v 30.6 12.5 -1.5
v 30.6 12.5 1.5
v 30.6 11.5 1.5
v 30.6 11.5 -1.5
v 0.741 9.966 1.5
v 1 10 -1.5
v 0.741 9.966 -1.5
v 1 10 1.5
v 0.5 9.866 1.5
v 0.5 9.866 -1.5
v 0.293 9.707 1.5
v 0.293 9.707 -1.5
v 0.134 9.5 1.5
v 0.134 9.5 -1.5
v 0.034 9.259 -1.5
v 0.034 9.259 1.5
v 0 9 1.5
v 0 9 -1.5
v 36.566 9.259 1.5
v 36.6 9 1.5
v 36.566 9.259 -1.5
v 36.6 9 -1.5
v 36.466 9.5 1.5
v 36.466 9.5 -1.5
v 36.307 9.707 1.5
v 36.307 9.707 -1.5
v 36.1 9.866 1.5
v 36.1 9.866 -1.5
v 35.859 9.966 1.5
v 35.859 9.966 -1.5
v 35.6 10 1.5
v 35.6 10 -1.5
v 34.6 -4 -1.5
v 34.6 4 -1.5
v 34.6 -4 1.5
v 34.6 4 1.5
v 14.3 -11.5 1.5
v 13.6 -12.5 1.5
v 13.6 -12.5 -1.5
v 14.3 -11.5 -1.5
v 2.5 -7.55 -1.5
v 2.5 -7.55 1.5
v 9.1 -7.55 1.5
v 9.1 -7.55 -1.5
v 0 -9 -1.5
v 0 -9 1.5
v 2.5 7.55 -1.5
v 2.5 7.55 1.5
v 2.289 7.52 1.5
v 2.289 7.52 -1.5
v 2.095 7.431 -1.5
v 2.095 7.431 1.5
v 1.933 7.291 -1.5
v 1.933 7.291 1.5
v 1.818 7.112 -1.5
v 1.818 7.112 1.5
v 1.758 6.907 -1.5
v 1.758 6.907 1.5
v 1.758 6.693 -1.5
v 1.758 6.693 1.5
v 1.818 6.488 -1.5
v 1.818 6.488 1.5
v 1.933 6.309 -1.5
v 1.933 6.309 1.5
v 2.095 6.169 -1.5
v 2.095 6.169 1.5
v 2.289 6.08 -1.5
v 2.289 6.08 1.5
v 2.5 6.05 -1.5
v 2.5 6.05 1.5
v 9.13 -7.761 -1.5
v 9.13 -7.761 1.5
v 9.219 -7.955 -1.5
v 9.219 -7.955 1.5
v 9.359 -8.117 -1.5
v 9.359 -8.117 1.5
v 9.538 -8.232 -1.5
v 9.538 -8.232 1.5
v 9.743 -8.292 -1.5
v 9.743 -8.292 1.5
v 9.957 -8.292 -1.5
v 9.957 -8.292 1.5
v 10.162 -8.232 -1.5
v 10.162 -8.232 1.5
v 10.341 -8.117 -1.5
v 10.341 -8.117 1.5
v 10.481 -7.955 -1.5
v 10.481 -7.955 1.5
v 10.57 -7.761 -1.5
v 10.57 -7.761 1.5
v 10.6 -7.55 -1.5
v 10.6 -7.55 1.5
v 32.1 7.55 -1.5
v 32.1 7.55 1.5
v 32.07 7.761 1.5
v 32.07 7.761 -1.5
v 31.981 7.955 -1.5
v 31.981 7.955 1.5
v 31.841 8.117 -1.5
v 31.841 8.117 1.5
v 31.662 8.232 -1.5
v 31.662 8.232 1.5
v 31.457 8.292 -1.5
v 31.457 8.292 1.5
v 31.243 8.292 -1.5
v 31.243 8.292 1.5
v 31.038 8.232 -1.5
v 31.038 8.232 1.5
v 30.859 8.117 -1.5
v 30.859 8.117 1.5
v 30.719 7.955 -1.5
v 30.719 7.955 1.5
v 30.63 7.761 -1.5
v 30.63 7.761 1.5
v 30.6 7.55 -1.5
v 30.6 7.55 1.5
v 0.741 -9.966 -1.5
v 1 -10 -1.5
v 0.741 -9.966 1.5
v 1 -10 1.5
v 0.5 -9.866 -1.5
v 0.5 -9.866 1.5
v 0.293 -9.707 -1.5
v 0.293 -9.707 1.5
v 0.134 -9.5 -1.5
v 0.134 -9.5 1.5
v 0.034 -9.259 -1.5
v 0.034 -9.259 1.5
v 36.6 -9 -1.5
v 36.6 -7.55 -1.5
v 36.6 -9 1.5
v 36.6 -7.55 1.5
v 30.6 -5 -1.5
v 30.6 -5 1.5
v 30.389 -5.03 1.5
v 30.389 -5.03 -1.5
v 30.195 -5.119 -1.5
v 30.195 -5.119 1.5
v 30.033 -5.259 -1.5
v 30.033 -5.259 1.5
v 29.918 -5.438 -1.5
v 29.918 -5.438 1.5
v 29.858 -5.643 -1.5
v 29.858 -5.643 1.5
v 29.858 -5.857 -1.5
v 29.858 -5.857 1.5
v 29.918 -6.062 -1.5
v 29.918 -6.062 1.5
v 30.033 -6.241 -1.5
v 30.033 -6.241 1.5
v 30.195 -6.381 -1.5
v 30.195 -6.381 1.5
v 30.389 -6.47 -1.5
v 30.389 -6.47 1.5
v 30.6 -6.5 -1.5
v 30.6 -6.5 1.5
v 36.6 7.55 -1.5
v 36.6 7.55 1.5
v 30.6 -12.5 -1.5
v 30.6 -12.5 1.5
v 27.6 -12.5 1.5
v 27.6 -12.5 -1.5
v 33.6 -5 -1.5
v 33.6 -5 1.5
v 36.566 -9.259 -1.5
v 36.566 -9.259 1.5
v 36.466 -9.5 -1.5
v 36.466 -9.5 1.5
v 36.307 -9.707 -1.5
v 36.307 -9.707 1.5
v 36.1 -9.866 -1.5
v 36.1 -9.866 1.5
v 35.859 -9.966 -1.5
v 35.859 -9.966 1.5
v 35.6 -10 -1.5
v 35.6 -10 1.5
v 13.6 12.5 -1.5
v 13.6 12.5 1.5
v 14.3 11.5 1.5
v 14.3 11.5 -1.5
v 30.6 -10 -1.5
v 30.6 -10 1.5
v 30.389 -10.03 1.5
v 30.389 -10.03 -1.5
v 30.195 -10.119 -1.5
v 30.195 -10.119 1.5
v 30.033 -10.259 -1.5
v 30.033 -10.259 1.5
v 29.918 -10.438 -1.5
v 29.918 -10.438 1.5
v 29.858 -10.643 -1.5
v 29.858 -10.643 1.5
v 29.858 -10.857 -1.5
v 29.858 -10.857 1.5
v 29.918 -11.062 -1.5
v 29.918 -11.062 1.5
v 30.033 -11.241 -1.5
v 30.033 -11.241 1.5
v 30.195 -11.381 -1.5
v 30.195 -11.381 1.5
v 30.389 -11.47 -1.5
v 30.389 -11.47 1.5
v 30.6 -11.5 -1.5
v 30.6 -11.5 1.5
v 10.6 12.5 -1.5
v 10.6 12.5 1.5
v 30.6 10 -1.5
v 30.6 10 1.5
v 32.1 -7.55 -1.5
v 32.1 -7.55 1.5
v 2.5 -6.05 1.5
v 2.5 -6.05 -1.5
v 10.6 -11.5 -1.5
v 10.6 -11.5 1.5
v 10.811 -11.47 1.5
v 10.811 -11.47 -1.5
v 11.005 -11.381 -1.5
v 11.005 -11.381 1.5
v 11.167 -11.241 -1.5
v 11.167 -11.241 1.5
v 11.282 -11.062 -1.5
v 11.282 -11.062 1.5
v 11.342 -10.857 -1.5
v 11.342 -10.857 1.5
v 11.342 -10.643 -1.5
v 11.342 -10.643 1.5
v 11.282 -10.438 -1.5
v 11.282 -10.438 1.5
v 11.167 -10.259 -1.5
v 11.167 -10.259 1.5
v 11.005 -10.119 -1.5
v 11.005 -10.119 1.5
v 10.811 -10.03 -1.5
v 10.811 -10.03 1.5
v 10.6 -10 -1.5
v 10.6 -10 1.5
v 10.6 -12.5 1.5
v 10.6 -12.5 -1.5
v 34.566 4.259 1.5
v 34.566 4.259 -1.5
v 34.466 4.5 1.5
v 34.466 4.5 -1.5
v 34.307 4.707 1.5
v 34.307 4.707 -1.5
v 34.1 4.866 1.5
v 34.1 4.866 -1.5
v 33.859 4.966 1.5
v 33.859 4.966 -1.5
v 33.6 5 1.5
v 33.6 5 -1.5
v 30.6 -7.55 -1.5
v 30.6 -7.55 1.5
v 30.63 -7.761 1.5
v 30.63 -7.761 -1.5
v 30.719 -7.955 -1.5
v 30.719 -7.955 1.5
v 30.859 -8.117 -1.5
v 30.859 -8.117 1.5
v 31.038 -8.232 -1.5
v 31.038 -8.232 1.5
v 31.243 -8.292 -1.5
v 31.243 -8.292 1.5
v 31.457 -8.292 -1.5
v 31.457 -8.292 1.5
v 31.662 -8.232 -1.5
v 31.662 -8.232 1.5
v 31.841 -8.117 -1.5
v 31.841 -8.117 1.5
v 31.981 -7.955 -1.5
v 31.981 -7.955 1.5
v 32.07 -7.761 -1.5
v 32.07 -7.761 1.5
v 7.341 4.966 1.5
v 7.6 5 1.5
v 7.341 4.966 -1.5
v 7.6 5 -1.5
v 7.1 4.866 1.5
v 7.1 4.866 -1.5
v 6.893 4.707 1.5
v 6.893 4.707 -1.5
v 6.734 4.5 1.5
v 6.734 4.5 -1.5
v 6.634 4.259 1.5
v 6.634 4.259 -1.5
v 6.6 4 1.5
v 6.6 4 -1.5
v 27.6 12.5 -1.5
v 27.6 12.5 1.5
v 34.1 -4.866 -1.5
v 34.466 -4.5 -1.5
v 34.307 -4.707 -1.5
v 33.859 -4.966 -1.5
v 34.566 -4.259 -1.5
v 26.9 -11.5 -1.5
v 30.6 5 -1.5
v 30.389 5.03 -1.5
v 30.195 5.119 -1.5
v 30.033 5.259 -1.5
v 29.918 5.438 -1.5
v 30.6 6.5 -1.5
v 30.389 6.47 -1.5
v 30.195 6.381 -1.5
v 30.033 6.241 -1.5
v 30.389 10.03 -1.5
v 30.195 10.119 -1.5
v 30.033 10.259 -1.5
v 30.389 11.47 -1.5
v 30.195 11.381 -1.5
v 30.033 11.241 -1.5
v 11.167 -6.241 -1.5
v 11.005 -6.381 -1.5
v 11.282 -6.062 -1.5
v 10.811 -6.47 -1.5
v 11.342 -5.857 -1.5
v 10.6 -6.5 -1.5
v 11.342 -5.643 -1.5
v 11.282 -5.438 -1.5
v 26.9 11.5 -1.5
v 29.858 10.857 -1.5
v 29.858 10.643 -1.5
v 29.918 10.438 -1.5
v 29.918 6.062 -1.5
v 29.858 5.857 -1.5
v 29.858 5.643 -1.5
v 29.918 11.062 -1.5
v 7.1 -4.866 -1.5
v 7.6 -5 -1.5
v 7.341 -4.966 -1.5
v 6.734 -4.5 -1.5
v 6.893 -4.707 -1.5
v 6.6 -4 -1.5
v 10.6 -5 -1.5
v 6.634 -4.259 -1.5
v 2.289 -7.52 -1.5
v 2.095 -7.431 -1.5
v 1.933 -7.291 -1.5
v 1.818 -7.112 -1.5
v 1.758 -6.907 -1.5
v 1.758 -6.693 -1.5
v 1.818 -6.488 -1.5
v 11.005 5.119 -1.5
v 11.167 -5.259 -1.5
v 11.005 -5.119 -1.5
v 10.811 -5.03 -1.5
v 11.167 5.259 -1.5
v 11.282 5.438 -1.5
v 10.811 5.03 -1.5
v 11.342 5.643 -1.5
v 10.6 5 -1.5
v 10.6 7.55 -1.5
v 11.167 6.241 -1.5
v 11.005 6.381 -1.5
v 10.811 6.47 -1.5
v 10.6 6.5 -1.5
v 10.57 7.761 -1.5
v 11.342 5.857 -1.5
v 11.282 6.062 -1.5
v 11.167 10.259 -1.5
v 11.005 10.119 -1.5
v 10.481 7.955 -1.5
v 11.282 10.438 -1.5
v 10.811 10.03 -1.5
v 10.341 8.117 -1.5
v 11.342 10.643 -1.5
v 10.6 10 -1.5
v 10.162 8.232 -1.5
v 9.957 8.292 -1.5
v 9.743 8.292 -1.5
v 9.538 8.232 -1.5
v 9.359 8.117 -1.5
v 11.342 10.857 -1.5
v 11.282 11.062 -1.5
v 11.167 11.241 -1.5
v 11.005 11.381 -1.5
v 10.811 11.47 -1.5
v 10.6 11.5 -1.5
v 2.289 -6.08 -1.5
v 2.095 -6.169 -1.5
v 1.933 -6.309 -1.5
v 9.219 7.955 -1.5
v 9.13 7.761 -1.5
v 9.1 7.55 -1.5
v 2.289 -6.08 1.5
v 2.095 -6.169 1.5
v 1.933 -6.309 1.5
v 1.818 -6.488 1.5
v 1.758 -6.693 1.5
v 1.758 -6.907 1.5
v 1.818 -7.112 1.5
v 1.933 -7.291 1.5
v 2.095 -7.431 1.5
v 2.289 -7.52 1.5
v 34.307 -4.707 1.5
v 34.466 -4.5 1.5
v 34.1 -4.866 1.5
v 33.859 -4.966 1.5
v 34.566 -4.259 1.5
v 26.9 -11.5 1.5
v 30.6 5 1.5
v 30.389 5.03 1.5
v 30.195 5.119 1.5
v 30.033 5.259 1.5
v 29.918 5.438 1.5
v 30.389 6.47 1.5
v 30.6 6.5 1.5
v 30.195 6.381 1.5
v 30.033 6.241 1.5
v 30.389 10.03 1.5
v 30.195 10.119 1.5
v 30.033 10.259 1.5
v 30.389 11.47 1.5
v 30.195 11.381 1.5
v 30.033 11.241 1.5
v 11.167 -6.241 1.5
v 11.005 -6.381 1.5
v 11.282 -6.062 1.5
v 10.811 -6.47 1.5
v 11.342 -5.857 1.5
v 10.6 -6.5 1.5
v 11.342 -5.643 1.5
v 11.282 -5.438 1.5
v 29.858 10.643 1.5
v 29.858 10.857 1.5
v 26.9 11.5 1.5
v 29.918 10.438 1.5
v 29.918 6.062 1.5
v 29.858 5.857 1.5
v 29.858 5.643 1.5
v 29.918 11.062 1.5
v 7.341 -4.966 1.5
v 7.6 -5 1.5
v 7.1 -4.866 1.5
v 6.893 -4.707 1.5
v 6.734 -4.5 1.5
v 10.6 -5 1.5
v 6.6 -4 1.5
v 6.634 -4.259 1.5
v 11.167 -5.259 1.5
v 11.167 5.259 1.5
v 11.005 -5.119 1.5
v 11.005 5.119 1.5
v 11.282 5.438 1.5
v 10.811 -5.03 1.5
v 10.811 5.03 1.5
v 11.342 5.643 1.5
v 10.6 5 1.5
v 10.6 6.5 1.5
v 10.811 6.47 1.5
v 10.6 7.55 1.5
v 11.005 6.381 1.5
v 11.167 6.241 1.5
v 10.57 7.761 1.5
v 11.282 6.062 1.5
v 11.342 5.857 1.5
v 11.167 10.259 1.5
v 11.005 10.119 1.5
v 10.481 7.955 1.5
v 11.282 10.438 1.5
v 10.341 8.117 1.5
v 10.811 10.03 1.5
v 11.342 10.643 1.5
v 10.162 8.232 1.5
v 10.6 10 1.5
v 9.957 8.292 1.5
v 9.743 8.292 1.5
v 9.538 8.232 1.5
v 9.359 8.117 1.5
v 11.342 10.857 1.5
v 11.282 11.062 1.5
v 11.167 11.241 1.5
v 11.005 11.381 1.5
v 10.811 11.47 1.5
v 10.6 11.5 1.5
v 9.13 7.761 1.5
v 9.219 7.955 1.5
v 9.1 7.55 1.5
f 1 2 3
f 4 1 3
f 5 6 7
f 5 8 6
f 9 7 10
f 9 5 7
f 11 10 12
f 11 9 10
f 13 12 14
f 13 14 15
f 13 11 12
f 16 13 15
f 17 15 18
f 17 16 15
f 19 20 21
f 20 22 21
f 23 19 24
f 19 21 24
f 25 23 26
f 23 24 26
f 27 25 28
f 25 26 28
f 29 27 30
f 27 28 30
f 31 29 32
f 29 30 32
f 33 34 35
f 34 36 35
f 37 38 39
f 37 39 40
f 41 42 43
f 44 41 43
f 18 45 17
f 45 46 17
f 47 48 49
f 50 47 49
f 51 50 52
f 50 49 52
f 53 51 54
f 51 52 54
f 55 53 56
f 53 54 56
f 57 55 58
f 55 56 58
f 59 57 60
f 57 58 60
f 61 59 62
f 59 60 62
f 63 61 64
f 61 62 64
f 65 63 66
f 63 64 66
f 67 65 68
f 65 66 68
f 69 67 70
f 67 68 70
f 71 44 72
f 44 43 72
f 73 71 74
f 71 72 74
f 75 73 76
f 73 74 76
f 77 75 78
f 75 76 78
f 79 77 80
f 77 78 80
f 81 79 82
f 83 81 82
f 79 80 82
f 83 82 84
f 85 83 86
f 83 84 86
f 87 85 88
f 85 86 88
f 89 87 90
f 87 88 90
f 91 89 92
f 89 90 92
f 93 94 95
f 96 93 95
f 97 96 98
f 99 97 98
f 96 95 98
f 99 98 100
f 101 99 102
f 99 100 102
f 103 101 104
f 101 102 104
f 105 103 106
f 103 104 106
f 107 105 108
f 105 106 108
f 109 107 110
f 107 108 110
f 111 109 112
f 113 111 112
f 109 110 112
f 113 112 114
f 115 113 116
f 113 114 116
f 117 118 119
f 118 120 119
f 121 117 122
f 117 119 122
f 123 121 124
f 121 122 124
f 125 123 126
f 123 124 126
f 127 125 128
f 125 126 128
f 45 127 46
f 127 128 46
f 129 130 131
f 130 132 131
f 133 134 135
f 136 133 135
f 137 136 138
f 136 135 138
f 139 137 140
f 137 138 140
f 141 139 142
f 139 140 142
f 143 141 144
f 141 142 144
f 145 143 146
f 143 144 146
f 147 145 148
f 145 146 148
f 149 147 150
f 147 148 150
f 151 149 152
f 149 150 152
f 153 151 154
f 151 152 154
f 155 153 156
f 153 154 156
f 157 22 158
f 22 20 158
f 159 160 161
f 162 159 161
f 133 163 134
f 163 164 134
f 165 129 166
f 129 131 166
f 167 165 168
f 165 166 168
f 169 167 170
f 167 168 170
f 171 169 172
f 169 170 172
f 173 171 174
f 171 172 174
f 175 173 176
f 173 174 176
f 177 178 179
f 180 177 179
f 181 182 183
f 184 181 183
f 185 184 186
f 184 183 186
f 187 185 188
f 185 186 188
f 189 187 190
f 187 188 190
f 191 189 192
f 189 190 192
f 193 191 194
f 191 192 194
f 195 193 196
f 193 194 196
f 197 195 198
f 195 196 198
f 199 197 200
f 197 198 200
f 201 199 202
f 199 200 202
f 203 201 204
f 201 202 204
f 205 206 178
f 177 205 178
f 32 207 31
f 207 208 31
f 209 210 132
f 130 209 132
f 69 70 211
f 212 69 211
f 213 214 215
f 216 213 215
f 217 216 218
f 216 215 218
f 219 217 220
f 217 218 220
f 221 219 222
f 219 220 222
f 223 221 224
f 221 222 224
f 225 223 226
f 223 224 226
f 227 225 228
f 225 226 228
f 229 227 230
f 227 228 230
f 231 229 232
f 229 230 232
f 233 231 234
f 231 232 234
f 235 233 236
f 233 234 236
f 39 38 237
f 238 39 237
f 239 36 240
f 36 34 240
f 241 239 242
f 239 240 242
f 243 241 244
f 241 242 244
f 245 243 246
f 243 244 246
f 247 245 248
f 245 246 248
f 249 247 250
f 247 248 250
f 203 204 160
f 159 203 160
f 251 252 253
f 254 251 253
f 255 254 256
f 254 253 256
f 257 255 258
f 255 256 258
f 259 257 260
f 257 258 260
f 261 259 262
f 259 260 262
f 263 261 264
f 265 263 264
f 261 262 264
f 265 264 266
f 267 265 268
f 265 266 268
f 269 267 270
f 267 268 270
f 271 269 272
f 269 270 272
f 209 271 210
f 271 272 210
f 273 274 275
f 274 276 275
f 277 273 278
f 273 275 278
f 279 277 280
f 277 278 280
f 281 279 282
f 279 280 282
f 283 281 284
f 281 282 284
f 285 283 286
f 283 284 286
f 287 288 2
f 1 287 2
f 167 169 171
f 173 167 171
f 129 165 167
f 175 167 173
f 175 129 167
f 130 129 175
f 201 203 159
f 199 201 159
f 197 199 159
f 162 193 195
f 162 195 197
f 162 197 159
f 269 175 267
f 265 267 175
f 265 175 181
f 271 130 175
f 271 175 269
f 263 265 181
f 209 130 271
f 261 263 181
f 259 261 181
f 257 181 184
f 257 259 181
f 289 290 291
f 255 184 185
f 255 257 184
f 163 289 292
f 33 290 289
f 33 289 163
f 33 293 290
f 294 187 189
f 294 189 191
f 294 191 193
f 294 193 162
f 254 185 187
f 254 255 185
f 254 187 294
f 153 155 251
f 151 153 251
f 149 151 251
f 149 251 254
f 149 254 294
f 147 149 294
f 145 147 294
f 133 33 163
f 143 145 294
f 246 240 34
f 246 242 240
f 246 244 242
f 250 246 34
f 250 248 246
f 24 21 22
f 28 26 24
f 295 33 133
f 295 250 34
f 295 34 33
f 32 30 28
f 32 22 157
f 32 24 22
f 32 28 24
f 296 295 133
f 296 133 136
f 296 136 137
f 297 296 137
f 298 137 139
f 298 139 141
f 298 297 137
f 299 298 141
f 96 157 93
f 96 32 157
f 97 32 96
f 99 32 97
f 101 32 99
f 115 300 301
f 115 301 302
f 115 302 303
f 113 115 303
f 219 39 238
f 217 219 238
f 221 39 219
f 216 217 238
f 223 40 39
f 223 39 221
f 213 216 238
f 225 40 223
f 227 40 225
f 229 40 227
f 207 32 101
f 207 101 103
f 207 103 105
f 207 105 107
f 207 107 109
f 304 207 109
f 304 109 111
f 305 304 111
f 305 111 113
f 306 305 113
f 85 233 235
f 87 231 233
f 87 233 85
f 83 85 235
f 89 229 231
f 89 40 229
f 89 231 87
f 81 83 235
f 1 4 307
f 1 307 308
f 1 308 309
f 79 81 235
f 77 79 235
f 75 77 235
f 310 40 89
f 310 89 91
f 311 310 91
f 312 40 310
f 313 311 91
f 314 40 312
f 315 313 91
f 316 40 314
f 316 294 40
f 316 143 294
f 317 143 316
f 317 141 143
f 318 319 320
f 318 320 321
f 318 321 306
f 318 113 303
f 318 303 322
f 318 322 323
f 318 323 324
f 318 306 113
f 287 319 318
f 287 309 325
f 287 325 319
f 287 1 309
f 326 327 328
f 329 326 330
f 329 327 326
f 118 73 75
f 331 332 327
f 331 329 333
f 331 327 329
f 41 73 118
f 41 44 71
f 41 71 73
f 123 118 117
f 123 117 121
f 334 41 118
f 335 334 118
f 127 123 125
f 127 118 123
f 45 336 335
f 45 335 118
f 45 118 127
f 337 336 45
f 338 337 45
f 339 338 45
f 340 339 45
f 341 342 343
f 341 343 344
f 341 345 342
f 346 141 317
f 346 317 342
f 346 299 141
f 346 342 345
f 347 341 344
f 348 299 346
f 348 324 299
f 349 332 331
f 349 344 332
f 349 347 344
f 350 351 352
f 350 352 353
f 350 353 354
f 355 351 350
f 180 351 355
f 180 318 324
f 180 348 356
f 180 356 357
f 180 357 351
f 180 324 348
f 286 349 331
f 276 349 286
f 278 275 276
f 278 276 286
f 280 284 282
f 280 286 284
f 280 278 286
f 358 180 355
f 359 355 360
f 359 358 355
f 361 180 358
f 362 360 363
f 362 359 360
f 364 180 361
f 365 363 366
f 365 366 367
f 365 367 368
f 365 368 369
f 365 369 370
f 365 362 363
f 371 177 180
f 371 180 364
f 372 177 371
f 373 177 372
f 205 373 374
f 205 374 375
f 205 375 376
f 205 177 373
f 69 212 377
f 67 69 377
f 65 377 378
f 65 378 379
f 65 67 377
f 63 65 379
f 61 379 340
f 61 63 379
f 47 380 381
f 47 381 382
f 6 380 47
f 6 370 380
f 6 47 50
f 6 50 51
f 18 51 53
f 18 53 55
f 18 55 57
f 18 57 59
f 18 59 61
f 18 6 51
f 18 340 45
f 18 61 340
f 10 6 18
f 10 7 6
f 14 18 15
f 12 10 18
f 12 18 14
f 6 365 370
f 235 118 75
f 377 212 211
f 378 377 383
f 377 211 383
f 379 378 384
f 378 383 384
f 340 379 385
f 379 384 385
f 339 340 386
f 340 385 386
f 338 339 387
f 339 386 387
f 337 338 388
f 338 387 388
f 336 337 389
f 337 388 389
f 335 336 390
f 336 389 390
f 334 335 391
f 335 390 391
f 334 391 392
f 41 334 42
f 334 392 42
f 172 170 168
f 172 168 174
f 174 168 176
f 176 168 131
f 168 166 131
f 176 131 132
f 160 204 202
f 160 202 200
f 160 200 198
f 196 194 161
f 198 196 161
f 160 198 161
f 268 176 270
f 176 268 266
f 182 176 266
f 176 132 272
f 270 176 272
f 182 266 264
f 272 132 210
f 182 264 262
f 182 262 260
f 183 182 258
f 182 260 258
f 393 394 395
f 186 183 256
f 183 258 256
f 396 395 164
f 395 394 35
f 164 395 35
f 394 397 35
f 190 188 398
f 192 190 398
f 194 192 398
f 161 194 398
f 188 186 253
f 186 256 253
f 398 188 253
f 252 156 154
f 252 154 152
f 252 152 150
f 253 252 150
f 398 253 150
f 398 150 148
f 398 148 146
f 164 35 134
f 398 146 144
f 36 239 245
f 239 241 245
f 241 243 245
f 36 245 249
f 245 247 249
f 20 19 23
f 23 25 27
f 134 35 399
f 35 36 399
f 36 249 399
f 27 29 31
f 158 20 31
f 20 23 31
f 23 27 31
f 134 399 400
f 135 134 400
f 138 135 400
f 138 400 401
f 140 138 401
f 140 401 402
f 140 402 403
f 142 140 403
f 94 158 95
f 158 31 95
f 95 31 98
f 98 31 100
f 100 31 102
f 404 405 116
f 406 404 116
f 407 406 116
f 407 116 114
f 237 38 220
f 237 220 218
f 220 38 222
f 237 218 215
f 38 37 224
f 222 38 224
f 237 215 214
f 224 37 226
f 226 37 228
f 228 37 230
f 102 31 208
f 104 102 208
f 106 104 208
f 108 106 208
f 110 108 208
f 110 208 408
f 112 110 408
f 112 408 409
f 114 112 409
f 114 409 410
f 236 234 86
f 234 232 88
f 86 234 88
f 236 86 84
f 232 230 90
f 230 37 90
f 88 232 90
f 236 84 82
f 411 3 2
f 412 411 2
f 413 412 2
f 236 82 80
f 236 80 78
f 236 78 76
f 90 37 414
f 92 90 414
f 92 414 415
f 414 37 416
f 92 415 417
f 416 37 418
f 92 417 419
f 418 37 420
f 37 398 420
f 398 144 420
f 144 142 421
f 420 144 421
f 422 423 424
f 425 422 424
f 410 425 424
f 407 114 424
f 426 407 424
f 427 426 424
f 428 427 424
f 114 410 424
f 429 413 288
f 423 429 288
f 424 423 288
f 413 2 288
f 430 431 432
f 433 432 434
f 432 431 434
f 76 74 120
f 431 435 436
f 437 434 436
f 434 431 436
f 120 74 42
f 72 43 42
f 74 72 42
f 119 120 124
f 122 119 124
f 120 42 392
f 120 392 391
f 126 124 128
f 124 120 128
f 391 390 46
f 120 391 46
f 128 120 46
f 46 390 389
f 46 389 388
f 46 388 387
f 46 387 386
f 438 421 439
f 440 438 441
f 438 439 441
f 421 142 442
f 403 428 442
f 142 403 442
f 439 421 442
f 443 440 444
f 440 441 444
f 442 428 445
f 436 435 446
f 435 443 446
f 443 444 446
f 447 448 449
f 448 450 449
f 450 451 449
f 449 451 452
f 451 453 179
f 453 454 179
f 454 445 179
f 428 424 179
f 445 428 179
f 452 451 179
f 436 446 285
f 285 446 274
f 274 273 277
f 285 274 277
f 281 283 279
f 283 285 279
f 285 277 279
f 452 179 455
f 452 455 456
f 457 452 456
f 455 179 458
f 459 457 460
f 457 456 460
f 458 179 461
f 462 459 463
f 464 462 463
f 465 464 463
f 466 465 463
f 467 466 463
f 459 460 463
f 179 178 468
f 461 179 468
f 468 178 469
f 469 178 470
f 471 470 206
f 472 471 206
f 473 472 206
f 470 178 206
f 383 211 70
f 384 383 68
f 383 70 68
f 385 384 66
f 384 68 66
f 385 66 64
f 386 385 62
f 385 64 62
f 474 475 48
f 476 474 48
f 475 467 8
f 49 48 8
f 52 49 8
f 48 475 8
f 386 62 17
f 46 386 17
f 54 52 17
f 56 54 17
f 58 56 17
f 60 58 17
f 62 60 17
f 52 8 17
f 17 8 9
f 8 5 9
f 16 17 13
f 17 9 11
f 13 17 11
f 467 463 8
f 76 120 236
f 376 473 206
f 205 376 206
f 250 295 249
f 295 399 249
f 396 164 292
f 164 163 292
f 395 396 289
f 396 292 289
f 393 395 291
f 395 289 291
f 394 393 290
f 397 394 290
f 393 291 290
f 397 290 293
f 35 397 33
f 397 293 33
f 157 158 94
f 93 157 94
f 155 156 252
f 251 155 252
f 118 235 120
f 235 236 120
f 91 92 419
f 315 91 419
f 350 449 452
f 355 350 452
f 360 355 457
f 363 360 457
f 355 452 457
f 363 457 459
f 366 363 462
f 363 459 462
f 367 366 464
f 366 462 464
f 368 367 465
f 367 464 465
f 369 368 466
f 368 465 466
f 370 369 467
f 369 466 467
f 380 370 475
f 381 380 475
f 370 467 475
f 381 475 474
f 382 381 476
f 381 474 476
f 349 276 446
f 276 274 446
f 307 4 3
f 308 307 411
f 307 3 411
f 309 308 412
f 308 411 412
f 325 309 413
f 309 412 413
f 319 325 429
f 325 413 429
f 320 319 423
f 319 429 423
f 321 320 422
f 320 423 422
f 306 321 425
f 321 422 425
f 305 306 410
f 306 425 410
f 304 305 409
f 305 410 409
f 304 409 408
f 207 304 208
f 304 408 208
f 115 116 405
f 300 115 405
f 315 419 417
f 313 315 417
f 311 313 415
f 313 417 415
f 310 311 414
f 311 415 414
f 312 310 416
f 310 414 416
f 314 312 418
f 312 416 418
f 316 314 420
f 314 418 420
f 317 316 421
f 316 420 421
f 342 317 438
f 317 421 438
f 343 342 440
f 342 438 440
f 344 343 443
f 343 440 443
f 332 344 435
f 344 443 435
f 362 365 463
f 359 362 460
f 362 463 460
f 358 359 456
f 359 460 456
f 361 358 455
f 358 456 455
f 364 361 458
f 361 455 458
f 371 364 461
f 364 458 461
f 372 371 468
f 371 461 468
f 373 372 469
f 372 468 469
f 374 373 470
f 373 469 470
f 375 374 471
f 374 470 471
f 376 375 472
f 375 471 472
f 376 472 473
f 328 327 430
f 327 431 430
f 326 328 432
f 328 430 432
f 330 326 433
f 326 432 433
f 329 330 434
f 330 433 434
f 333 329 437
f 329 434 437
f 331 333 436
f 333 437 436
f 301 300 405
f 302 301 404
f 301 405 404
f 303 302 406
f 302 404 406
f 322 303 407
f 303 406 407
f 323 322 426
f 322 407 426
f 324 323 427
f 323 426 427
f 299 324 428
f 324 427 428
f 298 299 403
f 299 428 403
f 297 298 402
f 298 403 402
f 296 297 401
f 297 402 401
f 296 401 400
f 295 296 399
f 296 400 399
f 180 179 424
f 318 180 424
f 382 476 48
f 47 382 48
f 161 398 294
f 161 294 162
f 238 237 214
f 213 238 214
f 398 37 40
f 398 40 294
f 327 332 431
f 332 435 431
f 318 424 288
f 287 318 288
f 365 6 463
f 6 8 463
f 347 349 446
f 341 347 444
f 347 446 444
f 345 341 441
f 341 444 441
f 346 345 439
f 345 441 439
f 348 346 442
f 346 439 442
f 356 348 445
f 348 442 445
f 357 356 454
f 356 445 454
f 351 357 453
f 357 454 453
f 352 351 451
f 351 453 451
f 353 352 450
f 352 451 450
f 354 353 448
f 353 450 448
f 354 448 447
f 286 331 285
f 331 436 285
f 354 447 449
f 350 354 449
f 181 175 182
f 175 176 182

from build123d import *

# Parameters (mm, degrees)
EXTRUDE_1_DEPTH     = 1.5
FILLET_1_R          = 1
SKETCH_3_R          = 0.75
CUT_EXTRUDE_1_DEPTH = 4
SKETCH_4_R          = 0.75
CUT_EXTRUDE_2_DEPTH = 4
SKETCH_5_R          = 0.75
CUT_EXTRUDE_3_DEPTH = 4
CUT_EXTRUDE_6_DEPTH = 4


with BuildPart() as part:
    # 草图1 → 凸台-拉伸1 (new body, symmetric)
    with BuildSketch(Plane.XY):
        Polygon((0, 10), (10.6, 10), (10.6, 12.5), (30.6, 12.5), (30.6, 10), (36.6, 10), (36.6, 7.55), (30.6, 7.55), (30.6, 5), (34.6, 5), (34.6, -5), (30.6, -5), (30.6, -7.55), (36.6, -7.55), (36.6, -10), (30.6, -10), (30.6, -12.5), (10.6, -12.5), (10.6, -10), (0, -10), align=None)
        Polygon((6.6, 5), (10.6, 5), (10.6, 7.55), (2.5, 7.55), (2.5, -7.55), (10.6, -7.55), (10.6, -5), (6.6, -5), align=None, mode=Mode.SUBTRACT)
    extrude(amount=EXTRUDE_1_DEPTH, both=True)

    # 圆角1
    fillet_1_edges = [part.edges().sort_by_distance(p)[0] for p in [
        (0, 10, 0),
        (36.6, 10, 0),
        (34.6, 5, 0),
        (34.6, -5, 0),
        (36.6, -10, 0),
        (0, -10, 0),
        (6.6, -5, 0),
        (6.6, 5, 0),
    ]]
    fillet(fillet_1_edges, radius=FILLET_1_R)

    # 草图3 → 切除-拉伸1 (cut, through all)
    with BuildSketch(Plane.XY.offset(1.5)):
        with Locations((9.85, 7.55)):
            Circle(SKETCH_3_R)
        with Locations((9.85, -7.55)):
            Circle(SKETCH_3_R)
        with Locations((31.35, 7.55)):
            Circle(SKETCH_3_R)
        with Locations((30.6, 5.75)):
            Circle(SKETCH_3_R)
        with Locations((30.6, -5.75)):
            Circle(SKETCH_3_R)
        with Locations((31.35, -7.55)):
            Circle(SKETCH_3_R)
        with Locations((10.6, 5.75)):
            Circle(SKETCH_3_R)
        with Locations((10.6, -5.75)):
            Circle(SKETCH_3_R)
    extrude(amount=-CUT_EXTRUDE_1_DEPTH, mode=Mode.SUBTRACT)

    # 草图4 → 切除-拉伸2 (cut, through all)
    with BuildSketch(Plane.XY.offset(1.5)):
        with Locations((10.6, 10.75)):
            Circle(SKETCH_4_R)
        with Locations((30.6, 10.75)):
            Circle(SKETCH_4_R)
        with Locations((10.6, -10.75)):
            Circle(SKETCH_4_R)
        with Locations((30.6, -10.75)):
            Circle(SKETCH_4_R)
    extrude(amount=-CUT_EXTRUDE_2_DEPTH, mode=Mode.SUBTRACT)

    # 草图5 → 切除-拉伸3 (cut, through all)
    with BuildSketch(Plane.XY.offset(1.5)):
        with Locations((2.5, 6.8)):
            Circle(SKETCH_5_R)
        with Locations((2.5, -6.8)):
            Circle(SKETCH_5_R)
    extrude(amount=-CUT_EXTRUDE_3_DEPTH, mode=Mode.SUBTRACT)

    # 草图8 → 切除-拉伸6 (cut, through all)
    with BuildSketch(Plane.XY.offset(1.5)):
        Polygon((13.6, -12.5), (14.300207538, -11.5), (26.899792462, -11.5), (27.6, -12.5), align=None)
    cut_extrude_6 = extrude(amount=-CUT_EXTRUDE_6_DEPTH, mode=Mode.SUBTRACT)

    # 镜向2: 切除-拉伸6 across plane
    add(cut_extrude_6.mirror(Plane.ZX), mode=Mode.SUBTRACT)


solid = part.part
